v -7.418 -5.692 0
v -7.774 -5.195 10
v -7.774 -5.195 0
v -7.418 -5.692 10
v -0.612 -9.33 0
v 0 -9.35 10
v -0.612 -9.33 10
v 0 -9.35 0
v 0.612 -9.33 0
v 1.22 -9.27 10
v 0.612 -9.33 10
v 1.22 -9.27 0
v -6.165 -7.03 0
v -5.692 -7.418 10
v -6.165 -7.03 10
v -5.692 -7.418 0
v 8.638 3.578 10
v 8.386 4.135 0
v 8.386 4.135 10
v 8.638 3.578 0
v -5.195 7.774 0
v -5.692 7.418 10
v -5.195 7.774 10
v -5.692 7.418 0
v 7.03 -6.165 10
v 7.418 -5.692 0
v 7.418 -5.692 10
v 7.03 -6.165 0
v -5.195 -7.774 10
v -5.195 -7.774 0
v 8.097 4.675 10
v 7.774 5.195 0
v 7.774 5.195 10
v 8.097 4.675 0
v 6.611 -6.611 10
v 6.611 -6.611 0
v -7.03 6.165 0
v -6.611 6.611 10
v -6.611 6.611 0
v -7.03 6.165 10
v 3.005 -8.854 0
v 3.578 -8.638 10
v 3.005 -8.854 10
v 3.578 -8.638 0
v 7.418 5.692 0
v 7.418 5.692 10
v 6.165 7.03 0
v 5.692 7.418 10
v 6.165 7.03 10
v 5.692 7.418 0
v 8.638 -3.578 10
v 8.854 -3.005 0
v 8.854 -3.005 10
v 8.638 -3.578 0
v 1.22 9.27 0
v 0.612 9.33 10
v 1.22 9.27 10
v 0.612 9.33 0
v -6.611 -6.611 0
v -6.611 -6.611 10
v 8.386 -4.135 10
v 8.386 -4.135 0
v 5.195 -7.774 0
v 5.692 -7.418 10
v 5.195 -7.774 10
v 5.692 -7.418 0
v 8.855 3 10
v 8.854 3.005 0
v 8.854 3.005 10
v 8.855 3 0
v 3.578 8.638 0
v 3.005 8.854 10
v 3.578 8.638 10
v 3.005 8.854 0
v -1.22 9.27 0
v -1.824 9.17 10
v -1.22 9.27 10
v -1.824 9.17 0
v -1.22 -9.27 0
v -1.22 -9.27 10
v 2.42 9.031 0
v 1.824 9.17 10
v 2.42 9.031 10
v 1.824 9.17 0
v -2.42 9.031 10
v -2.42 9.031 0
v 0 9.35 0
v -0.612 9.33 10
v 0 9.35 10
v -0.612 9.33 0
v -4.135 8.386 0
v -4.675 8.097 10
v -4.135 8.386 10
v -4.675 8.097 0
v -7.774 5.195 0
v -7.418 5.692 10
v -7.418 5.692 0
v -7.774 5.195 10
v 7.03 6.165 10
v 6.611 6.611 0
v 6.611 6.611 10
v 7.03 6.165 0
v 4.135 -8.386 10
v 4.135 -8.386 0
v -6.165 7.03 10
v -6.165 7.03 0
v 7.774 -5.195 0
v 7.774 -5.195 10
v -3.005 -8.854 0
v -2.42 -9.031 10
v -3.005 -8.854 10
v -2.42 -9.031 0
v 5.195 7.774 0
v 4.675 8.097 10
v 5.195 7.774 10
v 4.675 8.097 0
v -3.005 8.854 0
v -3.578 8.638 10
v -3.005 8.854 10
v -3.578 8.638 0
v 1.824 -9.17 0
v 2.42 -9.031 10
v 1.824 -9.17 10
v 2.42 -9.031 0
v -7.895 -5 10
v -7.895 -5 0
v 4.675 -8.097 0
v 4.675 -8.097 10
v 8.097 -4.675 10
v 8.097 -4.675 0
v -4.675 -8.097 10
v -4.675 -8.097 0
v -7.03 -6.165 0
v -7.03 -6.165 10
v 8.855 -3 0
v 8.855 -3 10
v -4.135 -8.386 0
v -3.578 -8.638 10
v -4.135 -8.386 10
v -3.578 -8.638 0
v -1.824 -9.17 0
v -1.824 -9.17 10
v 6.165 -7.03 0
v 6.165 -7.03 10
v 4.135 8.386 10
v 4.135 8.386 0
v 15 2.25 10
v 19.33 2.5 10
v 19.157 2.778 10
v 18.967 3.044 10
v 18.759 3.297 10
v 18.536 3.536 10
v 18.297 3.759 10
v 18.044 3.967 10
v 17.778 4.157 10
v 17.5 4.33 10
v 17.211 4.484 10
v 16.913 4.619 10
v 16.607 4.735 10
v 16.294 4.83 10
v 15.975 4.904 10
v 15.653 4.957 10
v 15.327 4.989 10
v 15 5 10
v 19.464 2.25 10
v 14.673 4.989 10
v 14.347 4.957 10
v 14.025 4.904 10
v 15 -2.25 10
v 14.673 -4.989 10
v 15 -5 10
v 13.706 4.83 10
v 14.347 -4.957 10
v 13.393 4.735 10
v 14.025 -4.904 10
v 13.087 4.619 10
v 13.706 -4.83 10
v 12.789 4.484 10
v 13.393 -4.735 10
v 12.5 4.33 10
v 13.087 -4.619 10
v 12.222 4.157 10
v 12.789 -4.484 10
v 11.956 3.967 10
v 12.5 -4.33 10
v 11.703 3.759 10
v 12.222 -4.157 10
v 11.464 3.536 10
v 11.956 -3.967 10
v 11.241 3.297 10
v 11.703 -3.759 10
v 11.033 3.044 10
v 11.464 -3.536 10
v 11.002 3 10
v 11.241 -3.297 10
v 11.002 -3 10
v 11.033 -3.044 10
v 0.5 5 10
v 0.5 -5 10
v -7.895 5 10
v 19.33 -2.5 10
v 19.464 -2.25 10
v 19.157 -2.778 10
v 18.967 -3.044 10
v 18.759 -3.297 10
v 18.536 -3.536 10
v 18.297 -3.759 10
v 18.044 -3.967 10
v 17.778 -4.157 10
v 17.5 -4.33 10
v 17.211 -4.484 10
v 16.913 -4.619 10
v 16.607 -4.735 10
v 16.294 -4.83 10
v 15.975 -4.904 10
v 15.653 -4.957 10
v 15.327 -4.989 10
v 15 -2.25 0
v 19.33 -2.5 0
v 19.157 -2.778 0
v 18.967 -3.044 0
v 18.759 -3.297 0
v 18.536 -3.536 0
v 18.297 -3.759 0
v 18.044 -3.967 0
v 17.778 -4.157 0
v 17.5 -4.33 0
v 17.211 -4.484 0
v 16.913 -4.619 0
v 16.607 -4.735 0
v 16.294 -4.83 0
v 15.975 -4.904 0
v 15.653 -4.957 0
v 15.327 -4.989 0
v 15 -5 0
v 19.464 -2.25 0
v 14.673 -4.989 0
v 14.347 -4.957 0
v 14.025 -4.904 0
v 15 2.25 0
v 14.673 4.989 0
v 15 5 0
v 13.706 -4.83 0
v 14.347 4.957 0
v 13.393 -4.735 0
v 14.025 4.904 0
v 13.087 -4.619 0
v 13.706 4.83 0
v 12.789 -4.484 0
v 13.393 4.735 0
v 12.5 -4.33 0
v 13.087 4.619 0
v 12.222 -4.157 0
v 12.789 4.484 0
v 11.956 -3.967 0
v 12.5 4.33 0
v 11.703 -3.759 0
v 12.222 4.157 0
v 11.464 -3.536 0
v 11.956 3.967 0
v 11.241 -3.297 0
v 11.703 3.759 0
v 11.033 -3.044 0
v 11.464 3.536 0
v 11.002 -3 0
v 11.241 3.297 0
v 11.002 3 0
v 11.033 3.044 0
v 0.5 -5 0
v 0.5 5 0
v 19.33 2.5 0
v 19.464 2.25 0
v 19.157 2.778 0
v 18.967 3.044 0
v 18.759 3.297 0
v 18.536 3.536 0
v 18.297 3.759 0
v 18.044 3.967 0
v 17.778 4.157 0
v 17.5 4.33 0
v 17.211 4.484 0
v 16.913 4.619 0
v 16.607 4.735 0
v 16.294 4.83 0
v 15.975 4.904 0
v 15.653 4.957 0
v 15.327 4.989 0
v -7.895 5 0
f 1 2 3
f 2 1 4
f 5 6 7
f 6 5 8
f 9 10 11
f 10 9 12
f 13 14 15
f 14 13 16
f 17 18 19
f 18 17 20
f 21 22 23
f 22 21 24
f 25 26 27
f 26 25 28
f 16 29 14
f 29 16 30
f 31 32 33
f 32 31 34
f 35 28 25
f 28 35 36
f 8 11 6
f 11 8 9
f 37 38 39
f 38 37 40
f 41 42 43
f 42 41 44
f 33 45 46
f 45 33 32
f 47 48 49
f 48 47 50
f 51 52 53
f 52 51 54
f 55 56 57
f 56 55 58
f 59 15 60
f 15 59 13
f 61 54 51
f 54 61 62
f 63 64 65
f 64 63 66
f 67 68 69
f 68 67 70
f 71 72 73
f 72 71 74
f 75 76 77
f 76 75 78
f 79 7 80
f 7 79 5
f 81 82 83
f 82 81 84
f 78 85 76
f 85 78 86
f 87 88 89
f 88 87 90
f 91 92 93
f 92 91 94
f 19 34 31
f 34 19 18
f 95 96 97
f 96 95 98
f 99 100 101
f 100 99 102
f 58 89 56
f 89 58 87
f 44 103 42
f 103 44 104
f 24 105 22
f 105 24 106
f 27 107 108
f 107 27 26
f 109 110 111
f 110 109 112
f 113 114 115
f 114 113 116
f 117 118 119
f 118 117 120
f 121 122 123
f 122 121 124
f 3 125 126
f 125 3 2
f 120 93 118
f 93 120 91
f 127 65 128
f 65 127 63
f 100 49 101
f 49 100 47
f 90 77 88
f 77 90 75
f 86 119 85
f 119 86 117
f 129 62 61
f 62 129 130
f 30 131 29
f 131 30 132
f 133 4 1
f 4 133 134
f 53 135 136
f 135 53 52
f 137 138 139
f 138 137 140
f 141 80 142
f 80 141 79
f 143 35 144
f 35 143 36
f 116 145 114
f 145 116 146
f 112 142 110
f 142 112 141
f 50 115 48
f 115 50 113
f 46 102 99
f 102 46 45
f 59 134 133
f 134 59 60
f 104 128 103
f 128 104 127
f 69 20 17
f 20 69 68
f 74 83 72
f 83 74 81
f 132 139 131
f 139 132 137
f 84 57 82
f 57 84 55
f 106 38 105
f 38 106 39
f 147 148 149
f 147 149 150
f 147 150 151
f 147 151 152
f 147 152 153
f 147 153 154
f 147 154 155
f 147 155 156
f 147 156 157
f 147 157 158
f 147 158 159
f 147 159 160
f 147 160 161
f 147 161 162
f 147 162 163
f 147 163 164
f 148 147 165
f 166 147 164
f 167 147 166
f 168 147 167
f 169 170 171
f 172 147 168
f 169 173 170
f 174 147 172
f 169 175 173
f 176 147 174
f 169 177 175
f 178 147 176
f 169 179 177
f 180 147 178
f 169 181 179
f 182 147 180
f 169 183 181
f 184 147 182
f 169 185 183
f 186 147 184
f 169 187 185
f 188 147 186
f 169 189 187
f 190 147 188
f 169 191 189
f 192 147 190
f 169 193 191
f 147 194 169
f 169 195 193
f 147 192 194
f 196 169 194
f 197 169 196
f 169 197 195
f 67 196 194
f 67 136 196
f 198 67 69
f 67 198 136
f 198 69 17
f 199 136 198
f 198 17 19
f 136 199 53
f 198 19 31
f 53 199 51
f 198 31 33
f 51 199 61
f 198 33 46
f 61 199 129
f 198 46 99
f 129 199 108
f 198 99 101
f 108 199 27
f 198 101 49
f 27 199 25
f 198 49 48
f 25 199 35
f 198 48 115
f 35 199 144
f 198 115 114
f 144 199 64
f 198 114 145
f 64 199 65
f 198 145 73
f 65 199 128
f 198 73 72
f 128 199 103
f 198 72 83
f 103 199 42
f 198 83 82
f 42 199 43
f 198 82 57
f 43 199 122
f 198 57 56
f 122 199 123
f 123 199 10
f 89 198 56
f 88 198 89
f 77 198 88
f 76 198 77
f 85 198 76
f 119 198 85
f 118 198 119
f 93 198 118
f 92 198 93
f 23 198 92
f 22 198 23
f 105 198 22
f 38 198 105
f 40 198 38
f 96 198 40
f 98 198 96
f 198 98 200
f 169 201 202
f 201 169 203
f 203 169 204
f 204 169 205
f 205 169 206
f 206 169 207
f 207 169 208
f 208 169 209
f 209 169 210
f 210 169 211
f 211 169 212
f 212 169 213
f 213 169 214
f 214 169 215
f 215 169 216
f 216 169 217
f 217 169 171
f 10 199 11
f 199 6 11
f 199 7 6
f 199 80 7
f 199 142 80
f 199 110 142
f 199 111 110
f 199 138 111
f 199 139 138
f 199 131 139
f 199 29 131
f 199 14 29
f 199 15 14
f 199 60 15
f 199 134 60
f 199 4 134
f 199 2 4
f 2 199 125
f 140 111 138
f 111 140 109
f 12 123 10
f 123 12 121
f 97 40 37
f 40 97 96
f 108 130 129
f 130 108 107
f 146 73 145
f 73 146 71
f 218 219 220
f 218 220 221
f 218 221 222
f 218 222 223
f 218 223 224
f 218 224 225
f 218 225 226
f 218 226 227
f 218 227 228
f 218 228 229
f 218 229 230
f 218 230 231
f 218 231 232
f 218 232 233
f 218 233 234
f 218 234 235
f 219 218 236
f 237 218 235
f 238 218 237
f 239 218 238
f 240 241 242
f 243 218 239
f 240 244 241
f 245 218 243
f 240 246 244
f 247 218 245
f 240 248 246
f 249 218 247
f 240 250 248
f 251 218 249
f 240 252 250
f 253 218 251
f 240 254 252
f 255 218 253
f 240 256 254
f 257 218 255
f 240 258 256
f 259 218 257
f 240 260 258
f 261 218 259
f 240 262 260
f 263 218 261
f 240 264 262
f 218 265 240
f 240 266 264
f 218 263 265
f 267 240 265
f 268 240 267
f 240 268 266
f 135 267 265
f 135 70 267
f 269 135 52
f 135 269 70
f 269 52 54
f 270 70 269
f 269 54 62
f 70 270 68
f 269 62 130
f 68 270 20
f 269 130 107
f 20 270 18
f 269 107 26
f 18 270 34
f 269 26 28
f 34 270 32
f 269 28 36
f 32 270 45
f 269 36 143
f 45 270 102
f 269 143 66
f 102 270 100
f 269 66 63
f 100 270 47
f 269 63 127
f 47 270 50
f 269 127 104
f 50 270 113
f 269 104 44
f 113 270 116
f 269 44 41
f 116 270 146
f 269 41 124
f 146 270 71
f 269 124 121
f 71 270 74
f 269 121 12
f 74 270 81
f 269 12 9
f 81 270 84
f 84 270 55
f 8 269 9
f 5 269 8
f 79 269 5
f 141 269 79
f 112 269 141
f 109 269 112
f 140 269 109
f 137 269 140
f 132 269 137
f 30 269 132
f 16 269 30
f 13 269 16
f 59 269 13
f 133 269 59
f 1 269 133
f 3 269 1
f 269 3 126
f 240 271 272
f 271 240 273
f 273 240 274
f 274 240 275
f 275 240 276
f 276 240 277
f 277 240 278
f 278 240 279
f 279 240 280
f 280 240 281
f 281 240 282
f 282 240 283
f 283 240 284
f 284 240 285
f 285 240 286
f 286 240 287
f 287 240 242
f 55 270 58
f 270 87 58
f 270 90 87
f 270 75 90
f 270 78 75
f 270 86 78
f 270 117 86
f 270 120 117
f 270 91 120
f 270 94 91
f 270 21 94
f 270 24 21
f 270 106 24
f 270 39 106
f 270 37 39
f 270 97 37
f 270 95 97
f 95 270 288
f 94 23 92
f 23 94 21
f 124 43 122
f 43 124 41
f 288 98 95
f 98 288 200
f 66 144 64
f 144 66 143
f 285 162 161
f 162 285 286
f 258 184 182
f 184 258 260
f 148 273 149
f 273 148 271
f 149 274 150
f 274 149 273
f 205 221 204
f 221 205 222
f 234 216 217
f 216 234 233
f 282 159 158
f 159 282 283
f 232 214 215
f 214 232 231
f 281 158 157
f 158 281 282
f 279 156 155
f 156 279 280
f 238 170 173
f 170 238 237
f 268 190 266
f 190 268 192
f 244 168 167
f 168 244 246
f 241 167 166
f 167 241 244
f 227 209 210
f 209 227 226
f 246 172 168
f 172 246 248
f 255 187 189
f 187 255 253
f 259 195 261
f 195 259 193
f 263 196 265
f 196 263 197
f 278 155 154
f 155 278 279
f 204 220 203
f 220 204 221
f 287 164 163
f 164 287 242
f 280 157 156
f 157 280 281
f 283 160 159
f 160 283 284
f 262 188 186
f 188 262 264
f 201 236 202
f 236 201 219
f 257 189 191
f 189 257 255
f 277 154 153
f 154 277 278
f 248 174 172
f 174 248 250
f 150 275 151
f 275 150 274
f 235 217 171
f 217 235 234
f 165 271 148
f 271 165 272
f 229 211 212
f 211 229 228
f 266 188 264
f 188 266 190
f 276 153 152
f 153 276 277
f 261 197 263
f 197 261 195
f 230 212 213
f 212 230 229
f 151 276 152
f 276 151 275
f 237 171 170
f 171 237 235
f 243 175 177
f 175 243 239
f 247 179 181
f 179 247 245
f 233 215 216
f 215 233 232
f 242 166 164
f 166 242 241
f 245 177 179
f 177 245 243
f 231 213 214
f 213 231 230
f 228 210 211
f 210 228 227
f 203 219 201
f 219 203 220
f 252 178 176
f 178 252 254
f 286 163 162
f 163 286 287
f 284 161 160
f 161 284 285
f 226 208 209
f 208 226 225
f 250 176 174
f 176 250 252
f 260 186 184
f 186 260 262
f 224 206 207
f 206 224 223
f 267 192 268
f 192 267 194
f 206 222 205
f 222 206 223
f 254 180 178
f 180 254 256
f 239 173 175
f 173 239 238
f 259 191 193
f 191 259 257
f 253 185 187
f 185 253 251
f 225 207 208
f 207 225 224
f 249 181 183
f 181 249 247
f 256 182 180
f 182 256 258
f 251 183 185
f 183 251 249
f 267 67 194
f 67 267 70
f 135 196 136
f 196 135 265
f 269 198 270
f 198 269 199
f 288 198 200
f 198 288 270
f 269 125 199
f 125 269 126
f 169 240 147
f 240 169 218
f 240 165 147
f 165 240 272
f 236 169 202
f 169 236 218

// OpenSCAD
// Tubing snap clip for a 12.7 mm (1/2 inch) lab stand rod
// Print orientation: flat on the bed, opens upward in +Z

// ---------- Parameters ----------
rod_d      = 12.7;   // stand rod diameter
ring_w     = 3;      // rod ring wall thickness
ring_od    = rod_d + 2*ring_w;  // rod ring outer diameter (18.7 mm)
ring_id    = rod_d;  // rod ring inner diameter (12.7 mm)

tub_d      = 6;      // tubing inner diameter
tub_w      = 2;      // tubing wall thickness
tub_od     = tub_d + 2*tub_w;    // tubing outer diameter (10 mm)
tub_x      = 15;     // tubing ring centre X position

bridge_x0  = 8;      // bridge start (X)
bridge_x1  = 12;     // bridge end (X)
bridge_w   = 6;      // bridge width (Y)

opening    = 10;     // rod ring opening width along -X (y from -5 to 5)
eps        = 0.5;    // cutter overshoot past faces

$fn = 96;

// ---------- Model ----------
difference() {
    union() {
        // Rod ring
        cylinder(d = ring_od, h = 10);

        // Tubing ring
        translate([tub_x, 0, 0])
            cylinder(d = tub_od, h = 10);

        // Solid bridge between the rings
        translate([bridge_x0, -bridge_w/2, 0])
            cube([bridge_x1 - bridge_x0, bridge_w, 10]);
    }

    // Rod ring opening cut out of the -X side
    translate([-ring_od - eps, -opening/2, -eps])
        cube([ring_od + 2*eps, opening, 10 + 2*eps]);

    // Tubing ring opening cut out of the +X side
    translate([tub_x, -2.25, -eps])
        cube([ring_od + 2*eps, 4.5, 10 + 2*eps]);
}
